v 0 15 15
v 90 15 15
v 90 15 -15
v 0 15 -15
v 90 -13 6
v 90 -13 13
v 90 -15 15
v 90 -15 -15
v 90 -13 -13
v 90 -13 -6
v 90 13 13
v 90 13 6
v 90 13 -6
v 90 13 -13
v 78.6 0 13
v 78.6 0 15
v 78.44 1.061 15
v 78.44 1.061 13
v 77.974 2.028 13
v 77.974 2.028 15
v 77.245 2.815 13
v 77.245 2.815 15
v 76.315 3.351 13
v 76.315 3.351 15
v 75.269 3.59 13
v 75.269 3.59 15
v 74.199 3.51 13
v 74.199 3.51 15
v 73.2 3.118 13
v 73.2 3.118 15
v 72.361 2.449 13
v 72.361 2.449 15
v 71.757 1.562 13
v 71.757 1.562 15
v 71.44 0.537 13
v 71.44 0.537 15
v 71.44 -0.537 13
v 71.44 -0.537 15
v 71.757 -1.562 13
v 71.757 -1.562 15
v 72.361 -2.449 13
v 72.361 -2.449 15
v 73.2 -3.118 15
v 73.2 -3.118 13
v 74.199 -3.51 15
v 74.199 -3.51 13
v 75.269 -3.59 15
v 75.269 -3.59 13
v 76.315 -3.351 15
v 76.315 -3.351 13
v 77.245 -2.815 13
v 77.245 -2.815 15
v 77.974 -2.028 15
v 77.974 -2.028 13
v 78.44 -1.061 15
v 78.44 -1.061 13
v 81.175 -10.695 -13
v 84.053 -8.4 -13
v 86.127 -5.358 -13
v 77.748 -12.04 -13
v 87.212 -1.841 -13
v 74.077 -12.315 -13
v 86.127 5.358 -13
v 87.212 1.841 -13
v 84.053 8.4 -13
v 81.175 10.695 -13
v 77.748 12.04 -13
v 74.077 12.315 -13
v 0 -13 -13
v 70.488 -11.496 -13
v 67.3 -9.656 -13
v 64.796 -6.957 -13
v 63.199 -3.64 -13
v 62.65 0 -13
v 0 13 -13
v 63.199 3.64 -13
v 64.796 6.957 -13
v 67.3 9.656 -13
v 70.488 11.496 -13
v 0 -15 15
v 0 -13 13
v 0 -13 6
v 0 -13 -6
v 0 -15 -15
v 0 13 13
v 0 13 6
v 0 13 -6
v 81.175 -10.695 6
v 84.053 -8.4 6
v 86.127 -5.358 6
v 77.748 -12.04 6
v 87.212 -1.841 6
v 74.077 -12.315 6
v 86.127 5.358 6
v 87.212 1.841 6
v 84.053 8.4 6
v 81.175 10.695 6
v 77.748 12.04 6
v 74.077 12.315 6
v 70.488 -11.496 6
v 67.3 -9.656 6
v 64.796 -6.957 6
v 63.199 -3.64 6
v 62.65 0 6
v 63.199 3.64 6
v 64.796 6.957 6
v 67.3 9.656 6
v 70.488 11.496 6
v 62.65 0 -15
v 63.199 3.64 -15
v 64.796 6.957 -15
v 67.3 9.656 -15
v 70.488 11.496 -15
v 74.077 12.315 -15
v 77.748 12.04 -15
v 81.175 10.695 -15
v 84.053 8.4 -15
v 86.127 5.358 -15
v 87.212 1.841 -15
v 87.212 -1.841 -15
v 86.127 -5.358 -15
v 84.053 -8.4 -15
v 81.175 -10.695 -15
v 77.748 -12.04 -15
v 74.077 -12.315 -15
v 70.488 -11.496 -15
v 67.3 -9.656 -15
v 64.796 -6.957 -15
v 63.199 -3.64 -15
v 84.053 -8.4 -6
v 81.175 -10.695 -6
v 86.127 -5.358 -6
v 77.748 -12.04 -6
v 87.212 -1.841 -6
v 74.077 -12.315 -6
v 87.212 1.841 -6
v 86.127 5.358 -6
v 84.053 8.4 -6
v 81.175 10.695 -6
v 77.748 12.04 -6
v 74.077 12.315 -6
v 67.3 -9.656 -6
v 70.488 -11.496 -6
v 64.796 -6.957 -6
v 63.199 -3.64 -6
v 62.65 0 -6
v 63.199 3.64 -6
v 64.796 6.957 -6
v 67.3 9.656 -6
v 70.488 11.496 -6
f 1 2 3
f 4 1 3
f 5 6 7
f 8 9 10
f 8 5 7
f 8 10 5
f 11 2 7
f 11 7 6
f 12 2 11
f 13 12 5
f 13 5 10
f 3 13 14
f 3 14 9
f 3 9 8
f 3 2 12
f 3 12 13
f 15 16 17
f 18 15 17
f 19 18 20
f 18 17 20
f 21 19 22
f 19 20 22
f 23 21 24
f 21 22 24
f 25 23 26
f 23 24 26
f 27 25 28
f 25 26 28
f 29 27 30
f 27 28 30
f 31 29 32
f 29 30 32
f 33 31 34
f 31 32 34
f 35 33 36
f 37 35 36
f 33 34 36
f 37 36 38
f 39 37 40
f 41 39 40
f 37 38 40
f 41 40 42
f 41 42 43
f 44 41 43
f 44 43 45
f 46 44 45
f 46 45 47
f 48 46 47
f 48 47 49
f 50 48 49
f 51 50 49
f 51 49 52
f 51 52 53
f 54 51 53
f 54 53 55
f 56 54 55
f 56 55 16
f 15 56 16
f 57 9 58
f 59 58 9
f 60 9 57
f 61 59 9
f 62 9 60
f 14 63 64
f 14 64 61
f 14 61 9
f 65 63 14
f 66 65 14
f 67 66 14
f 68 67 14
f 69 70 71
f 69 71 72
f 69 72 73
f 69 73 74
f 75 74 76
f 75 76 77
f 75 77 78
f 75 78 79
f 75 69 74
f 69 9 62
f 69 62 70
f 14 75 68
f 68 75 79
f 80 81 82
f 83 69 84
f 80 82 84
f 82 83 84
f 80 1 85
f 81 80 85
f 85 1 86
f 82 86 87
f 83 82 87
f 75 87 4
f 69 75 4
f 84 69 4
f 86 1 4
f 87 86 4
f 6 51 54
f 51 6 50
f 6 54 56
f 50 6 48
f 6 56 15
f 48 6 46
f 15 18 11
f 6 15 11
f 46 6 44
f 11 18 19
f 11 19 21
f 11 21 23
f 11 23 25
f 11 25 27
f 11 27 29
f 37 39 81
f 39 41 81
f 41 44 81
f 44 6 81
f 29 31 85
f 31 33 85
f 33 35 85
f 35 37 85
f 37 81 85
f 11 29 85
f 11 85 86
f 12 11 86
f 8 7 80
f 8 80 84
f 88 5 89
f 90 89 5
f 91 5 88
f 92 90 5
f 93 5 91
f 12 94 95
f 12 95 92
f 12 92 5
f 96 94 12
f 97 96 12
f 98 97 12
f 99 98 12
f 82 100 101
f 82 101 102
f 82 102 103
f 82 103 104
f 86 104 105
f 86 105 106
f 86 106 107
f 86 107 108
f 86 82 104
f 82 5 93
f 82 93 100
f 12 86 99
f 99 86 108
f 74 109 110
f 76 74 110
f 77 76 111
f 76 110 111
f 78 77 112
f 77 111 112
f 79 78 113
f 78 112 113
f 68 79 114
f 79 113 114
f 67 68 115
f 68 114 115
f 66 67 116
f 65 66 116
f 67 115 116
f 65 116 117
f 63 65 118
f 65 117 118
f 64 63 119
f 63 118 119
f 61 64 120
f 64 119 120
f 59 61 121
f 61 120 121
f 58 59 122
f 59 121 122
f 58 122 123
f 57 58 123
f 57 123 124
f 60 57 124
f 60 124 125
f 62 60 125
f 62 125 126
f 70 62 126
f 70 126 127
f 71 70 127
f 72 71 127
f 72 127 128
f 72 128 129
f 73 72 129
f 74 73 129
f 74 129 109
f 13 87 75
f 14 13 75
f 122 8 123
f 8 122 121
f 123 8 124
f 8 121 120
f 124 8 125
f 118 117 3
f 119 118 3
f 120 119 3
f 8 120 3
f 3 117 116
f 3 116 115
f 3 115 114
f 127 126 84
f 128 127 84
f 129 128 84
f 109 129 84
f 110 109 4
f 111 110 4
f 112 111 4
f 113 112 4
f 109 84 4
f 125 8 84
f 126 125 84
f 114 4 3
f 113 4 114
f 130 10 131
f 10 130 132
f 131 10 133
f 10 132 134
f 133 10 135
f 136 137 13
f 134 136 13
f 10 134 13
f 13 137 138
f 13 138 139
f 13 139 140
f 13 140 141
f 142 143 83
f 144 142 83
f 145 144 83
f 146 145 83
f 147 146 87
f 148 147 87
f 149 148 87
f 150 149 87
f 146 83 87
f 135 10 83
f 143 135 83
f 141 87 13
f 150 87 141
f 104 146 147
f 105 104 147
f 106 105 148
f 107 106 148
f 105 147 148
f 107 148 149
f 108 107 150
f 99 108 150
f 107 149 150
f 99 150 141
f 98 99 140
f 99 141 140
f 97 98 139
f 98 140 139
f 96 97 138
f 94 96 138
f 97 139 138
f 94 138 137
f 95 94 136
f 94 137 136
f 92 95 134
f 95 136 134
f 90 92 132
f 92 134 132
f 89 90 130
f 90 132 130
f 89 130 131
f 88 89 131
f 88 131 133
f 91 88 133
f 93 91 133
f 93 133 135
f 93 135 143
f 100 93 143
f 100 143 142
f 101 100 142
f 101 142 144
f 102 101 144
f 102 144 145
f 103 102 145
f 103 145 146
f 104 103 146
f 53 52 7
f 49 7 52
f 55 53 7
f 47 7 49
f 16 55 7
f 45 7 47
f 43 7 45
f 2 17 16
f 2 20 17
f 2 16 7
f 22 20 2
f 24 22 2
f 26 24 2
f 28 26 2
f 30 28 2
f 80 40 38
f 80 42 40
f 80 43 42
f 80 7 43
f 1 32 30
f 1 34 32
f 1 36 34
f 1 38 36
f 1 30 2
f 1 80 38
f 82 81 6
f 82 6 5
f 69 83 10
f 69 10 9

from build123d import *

# Parameters (mm, degrees)
SKETCH1_W           = 30
SKETCH1_H           = 30
SKETCH1_W_2         = 7
SKETCH1_H_2         = 26
BOSS_EXTRUDE3_DEPTH = 90
SKETCH6_R           = 12.35
CUT_EXTRUDE5_DEPTH  = 23
SKETCH8_R           = 3.6
CUT_EXTRUDE6_DEPTH  = 17


with BuildPart() as part:
    # Sketch1 → Boss-Extrude3 (new body)
    with BuildSketch(Plane(origin=(0, 0, 0), x_dir=(0, 0, -1), z_dir=(1, 0, 0))):
        Rectangle(SKETCH1_W, SKETCH1_H)
        with Locations((-9.5, 0)):
            Rectangle(SKETCH1_W_2, SKETCH1_H_2, mode=Mode.SUBTRACT)
        with Locations((9.5, 0)):
            Rectangle(SKETCH1_W_2, SKETCH1_H_2, mode=Mode.SUBTRACT)
    extrude(amount=BOSS_EXTRUDE3_DEPTH)

    # Sketch6 → Cut-Extrude5 (cut)
    with BuildSketch(Plane(origin=(0, 0, -15), x_dir=(-1, 0, 0), z_dir=(0, 0, -1))):
        with Locations((-75, 0)):
            Circle(SKETCH6_R)
    extrude(amount=-CUT_EXTRUDE5_DEPTH, mode=Mode.SUBTRACT)

    # Sketch8 → Cut-Extrude6 (cut)
    with BuildSketch(Plane.XY.offset(15)):
        with Locations((75, 0)):
            Circle(SKETCH8_R)
    extrude(amount=-CUT_EXTRUDE6_DEPTH, mode=Mode.SUBTRACT)


solid = part.part
